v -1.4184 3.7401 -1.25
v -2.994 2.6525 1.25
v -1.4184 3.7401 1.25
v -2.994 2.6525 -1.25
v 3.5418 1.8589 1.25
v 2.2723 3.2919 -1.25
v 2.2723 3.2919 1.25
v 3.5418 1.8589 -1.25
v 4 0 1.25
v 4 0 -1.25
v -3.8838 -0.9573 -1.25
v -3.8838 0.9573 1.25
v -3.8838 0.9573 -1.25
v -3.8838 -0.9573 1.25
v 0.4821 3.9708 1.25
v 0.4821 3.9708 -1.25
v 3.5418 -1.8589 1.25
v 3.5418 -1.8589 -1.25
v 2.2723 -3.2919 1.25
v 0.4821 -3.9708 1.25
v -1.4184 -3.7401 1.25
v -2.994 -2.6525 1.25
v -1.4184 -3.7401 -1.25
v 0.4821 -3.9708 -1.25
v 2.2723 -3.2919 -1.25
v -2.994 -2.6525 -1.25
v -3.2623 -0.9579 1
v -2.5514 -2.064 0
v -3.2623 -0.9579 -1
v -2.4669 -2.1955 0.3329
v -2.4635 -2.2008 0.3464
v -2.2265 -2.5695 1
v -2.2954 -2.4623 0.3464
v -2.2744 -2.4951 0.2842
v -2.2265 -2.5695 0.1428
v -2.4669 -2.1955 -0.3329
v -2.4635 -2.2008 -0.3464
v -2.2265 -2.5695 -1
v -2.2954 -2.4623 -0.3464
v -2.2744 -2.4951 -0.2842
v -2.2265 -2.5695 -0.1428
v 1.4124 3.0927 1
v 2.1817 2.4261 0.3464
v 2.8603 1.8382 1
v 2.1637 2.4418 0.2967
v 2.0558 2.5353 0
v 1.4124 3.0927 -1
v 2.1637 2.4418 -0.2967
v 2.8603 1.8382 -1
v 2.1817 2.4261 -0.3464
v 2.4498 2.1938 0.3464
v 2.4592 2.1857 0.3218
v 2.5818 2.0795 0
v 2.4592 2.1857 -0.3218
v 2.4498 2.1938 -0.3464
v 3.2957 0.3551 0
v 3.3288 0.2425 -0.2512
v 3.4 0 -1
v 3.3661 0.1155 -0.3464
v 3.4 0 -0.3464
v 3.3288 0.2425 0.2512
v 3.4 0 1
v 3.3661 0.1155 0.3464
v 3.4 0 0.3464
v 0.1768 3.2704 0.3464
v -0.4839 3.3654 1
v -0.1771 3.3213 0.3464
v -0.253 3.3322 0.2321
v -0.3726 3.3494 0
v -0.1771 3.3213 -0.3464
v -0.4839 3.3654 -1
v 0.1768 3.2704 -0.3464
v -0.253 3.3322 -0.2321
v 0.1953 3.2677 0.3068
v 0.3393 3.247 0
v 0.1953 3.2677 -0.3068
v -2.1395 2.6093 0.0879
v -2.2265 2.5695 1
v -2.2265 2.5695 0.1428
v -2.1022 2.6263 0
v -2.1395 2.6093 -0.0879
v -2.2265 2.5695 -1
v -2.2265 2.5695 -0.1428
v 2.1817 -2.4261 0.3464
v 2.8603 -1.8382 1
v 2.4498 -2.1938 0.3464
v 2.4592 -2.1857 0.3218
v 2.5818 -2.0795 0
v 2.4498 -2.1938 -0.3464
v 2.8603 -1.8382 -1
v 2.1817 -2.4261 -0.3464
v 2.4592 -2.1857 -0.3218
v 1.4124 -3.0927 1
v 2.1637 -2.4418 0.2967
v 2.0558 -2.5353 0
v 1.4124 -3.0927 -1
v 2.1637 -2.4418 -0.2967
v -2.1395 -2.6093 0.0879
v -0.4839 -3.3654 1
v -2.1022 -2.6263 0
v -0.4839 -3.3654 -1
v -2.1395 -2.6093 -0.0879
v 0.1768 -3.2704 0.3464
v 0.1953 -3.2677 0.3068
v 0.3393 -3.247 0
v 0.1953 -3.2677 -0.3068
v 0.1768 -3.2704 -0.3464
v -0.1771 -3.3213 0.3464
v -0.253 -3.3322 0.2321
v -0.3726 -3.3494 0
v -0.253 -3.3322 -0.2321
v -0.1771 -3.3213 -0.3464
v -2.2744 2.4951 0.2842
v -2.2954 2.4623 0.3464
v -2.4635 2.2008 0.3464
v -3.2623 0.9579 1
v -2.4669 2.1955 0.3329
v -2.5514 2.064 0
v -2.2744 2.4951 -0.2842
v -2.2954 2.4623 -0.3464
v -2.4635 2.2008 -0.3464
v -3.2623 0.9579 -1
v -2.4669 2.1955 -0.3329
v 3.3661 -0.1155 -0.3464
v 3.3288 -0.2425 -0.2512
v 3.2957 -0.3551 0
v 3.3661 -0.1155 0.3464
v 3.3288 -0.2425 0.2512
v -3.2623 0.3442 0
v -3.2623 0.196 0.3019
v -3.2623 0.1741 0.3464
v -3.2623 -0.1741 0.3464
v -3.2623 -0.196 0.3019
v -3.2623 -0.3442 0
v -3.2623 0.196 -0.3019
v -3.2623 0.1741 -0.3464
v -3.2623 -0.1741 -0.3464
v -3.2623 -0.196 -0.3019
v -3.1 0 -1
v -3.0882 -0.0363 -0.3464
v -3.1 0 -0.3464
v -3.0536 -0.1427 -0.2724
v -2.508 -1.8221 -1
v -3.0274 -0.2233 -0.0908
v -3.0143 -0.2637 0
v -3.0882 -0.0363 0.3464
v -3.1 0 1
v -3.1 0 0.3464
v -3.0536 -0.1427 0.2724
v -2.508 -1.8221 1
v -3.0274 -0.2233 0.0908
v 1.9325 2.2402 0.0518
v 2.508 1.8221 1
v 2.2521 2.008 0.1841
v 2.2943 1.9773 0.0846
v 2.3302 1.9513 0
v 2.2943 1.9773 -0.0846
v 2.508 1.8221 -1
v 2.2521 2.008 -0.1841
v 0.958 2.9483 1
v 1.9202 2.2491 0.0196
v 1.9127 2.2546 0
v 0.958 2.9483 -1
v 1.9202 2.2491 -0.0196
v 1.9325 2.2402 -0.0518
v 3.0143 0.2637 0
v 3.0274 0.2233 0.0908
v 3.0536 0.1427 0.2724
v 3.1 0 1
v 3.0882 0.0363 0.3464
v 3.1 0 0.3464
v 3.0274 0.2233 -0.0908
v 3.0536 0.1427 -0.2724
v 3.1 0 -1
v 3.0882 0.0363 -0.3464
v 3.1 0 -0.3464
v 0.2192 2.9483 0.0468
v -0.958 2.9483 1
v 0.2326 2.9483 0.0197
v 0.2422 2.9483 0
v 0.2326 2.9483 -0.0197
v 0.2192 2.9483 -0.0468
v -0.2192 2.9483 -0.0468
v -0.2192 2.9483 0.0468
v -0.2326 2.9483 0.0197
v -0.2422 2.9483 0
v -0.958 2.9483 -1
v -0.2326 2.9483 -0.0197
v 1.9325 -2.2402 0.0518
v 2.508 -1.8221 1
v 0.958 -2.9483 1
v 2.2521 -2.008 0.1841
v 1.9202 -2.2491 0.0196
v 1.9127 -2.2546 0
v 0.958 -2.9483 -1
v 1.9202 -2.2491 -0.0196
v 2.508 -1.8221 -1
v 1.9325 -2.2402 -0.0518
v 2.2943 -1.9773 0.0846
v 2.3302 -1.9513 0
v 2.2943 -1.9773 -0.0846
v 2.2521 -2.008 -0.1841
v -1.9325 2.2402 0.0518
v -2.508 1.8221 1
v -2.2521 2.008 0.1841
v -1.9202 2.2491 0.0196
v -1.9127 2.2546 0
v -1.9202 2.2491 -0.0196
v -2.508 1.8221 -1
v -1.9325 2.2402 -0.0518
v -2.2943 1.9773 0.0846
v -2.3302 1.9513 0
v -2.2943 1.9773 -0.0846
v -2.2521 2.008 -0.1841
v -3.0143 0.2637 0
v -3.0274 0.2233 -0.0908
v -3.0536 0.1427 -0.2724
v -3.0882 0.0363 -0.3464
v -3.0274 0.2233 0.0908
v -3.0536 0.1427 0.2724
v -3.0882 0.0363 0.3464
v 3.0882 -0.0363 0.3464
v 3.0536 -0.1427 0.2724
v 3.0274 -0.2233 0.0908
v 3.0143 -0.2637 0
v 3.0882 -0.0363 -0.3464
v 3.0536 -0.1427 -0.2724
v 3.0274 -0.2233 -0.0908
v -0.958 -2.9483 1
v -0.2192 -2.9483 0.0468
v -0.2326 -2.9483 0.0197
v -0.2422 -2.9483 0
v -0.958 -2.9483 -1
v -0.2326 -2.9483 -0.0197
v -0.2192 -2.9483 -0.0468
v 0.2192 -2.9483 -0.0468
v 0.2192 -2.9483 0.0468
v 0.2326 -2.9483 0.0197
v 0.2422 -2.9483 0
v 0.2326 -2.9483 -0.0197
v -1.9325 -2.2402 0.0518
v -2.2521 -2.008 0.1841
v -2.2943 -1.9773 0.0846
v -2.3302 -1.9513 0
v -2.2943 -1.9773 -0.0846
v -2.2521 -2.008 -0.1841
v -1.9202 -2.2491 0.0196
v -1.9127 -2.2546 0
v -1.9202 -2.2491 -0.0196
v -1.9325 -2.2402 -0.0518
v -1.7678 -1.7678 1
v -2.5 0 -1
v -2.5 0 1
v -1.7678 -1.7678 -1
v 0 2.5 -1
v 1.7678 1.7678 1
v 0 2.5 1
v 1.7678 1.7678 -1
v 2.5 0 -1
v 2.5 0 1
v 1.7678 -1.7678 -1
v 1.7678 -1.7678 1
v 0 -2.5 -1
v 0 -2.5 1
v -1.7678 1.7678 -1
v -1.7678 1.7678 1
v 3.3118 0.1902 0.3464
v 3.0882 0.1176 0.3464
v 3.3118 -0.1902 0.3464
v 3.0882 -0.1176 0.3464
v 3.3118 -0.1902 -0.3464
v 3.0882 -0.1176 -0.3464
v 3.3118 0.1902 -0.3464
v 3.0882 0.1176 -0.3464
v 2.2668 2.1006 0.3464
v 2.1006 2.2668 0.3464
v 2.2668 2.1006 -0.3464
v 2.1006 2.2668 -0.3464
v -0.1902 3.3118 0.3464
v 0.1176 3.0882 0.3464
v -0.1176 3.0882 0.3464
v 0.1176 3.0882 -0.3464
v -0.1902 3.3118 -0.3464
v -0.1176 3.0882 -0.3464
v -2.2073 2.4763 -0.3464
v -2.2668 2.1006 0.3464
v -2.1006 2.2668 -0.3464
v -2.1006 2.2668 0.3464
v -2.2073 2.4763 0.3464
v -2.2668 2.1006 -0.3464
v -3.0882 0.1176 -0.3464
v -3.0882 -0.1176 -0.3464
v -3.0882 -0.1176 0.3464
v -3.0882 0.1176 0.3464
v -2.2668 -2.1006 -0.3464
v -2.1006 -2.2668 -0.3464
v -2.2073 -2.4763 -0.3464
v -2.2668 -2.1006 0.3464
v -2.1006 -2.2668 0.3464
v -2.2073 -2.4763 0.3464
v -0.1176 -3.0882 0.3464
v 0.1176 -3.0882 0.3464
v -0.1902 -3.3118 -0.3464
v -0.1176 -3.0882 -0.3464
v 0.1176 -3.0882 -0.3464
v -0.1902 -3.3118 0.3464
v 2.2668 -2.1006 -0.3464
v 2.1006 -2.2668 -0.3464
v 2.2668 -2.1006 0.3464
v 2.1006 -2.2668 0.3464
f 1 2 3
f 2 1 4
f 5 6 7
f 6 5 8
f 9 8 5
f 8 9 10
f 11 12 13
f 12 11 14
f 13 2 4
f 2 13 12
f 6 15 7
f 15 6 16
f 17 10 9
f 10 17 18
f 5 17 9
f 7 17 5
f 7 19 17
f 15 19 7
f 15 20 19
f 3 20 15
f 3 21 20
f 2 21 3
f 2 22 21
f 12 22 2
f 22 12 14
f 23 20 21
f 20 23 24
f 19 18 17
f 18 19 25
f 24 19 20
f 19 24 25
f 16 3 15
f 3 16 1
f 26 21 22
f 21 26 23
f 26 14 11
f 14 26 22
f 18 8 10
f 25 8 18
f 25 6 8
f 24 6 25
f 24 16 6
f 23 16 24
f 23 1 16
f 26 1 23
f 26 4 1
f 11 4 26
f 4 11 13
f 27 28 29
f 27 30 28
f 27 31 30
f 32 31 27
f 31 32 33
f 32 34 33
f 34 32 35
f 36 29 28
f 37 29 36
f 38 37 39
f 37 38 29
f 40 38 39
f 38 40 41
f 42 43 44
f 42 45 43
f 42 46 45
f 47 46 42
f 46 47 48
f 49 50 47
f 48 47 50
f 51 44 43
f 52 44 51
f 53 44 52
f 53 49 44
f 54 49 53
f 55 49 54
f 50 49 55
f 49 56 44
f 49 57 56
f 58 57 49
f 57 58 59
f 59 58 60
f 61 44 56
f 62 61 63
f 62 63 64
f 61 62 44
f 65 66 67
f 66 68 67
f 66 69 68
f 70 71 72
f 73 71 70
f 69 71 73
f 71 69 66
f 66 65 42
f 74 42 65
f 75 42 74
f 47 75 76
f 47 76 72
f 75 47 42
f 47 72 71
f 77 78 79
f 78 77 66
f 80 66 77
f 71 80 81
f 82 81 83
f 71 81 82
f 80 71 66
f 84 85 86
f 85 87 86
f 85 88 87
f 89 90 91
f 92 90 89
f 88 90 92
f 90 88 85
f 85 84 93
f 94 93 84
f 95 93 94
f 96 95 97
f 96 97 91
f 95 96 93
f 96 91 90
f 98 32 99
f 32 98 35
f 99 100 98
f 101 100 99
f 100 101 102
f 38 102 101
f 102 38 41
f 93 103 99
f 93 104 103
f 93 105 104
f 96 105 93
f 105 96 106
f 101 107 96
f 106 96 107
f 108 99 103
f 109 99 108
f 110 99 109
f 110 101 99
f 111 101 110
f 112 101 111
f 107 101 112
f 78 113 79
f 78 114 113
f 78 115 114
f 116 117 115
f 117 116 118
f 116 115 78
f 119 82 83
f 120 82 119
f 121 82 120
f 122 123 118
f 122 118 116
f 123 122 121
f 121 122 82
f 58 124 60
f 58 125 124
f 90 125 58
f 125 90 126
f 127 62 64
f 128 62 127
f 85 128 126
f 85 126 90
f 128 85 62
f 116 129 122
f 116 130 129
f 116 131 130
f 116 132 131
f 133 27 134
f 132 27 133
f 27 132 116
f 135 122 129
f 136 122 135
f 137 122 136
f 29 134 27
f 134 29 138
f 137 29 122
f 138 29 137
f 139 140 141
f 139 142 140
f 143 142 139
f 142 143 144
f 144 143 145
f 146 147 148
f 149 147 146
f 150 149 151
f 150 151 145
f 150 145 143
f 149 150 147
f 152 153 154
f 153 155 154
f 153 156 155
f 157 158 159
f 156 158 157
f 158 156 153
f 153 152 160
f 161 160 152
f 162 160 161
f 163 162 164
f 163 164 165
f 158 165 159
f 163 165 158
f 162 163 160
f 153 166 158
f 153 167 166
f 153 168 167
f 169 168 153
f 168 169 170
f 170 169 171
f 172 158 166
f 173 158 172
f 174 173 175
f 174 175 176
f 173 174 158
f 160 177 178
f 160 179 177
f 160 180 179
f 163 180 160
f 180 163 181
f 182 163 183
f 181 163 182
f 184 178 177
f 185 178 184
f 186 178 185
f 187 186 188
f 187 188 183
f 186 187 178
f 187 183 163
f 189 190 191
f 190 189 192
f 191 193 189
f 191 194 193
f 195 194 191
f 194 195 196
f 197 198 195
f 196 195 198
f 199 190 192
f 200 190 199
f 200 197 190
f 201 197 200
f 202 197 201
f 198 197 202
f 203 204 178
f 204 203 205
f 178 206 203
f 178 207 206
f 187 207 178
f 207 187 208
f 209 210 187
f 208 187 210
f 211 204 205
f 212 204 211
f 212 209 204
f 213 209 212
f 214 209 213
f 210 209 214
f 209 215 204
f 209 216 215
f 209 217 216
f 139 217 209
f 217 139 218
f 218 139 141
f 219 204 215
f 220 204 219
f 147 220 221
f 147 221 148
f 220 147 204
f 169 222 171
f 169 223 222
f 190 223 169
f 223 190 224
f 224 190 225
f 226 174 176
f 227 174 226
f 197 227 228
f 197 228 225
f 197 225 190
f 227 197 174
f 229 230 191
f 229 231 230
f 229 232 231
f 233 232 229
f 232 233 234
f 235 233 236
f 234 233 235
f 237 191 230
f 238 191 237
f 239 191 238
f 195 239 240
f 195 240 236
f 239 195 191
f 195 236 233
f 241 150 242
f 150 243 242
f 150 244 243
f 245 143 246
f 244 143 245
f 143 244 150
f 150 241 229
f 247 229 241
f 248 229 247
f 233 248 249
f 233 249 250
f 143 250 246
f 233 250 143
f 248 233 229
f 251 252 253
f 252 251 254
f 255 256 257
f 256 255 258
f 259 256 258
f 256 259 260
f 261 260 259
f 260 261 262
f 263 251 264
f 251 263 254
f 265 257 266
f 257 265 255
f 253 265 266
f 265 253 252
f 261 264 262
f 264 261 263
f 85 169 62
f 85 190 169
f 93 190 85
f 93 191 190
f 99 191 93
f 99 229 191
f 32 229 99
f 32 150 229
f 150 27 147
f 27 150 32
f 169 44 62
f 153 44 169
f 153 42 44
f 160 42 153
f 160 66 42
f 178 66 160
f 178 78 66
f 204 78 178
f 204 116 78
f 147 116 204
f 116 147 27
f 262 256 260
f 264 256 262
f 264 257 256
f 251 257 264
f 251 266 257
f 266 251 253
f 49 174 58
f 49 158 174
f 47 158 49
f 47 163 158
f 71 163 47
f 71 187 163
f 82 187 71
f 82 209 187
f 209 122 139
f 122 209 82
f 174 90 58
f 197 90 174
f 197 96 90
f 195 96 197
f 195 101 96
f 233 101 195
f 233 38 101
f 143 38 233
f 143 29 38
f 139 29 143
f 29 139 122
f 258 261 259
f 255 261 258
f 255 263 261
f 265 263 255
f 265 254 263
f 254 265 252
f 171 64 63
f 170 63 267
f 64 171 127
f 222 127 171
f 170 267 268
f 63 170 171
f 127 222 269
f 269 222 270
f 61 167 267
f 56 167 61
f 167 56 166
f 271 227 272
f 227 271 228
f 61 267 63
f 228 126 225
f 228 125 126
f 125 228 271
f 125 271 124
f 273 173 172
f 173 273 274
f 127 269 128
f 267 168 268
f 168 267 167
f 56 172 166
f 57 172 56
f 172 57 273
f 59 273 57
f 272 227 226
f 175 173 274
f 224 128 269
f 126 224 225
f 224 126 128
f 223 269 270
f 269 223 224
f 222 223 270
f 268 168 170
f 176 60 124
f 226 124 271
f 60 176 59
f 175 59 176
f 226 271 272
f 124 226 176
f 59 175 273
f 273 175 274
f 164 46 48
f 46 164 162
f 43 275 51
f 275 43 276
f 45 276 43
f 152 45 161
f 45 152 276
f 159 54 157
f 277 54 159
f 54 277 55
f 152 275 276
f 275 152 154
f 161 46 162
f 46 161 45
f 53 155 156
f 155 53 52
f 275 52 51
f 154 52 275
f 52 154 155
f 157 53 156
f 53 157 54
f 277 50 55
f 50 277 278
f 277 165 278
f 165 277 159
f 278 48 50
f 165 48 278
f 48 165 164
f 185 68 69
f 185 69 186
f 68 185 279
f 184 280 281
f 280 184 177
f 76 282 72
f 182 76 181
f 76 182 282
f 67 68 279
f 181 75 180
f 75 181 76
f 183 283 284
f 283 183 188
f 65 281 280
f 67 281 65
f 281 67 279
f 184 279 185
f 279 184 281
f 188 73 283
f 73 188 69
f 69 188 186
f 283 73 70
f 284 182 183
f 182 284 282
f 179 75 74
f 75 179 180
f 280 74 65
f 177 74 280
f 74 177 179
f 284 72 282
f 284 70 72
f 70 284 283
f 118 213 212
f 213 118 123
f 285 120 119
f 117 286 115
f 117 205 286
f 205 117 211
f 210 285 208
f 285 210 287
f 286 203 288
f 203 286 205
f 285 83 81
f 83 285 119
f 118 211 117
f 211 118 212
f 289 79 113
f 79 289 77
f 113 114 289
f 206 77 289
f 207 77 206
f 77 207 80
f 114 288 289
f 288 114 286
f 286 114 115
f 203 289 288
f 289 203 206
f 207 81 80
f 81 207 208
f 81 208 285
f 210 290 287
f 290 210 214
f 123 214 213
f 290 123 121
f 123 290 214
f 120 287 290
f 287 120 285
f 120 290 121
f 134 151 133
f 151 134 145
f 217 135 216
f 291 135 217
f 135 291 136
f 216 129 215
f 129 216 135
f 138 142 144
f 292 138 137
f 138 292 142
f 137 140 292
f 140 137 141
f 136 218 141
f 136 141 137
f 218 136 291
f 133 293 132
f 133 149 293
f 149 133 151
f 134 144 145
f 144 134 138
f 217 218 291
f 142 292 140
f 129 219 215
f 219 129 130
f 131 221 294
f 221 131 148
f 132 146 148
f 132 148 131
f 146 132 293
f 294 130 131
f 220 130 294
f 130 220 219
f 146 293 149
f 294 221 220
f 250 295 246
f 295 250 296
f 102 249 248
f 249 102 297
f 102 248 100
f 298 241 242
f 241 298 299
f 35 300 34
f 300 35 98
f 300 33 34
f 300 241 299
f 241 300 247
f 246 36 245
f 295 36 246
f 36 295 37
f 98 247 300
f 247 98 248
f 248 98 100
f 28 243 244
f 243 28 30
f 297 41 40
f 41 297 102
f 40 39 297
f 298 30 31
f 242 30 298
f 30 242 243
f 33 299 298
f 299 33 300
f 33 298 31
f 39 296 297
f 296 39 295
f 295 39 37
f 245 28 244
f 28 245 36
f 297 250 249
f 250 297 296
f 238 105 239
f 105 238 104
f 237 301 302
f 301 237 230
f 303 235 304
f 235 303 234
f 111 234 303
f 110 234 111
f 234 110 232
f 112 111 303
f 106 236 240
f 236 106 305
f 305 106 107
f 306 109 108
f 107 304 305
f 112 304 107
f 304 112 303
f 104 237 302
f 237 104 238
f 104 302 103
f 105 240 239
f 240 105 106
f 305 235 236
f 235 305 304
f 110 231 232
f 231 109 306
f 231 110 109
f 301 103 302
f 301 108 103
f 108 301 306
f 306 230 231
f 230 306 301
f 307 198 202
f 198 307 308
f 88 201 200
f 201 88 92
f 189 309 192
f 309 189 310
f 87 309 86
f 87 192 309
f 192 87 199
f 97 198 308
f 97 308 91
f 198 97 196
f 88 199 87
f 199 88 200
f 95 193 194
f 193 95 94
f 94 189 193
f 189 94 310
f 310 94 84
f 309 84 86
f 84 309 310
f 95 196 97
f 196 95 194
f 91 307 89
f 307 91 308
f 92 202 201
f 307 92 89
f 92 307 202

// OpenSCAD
// Parameters
bore_diameter_mm = 5; //[2.5:10:0.1]
outer_diameter_mm = 8; //[4:16:0.1]
width_mm = 2.5; //[1.25:5:0.05]
radial_rim_thickness_mm = 0.6; //[0.3:1.2:0.05]
inner_race_radial_thickness_mm = 0.6; //[0.3:1.2:0.05]
shield_thickness_mm = 0.25; //[0.15:0.6:0.05]
shield_radial_overlap_mm = 0.2; //[0.05:0.6:0.05]
ball_diameter_mm = 0.8; //[0.4:1.4:0.05]
ball_count = 8; //[5:14:1]
ball_radial_overlap_mm = 0.15; //[0.05:0.4:0.05]
eps_mm = 0.05; //[0.01:0.2:0.01]

// Bearing Ball - complete geometry
module bearing_ball() {
  color("Silver") {
    sphere(r=ball_diameter_mm/2);
  }
}

// Ball Bearing - complete geometry
module ball_bearing() {
  color("DimGray") {
    // Outer Race
    difference() {
      cylinder(r=outer_diameter_mm/2, h=width_mm, center=true);
      cylinder(r=outer_diameter_mm/2 - radial_rim_thickness_mm, h=width_mm + 2*eps_mm, center=true);
    }
    
    // Inner Race
    difference() {
      cylinder(r=bore_diameter_mm/2 + inner_race_radial_thickness_mm, h=width_mm, center=true);
      cylinder(r=bore_diameter_mm/2, h=width_mm + 2*eps_mm, center=true);
    }
    
    // Shields
    union() {
      translate([0, 0, width_mm/2 - shield_thickness_mm/2])
        cylinder(r=outer_diameter_mm/2 - radial_rim_thickness_mm + shield_radial_overlap_mm, h=shield_thickness_mm, center=true);
      translate([0, 0, -(width_mm/2 - shield_thickness_mm/2)])
        cylinder(r=outer_diameter_mm/2 - radial_rim_thickness_mm + shield_radial_overlap_mm, h=shield_thickness_mm, center=true);
    }
    
    // Bearing Balls
    for (i = [0:ball_count-1]) {
      rotate([0, 0, i*360/ball_count])
        translate([((bore_diameter_mm/2 + inner_race_radial_thickness_mm) + (outer_diameter_mm/2 - radial_rim_thickness_mm))/2, 0, 0])
          bearing_ball();
    }
  }
}

// Assembly
module assembly() {
  ball_bearing();
}

assembly();
